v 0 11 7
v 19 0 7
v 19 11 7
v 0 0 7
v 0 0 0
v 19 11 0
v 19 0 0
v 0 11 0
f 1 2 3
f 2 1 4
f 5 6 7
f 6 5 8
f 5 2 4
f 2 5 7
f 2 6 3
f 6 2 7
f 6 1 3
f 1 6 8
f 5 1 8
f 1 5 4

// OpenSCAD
// Generated by SolidPython 1.0.1 on 2020-07-29 00:46:56


cube(size = [19, 11, 7]);
/***********************************************
*********      SolidPython code:      **********
************************************************
 
# import packages: SolidPython
from solid import *
from solid.utils import *
from itertools import chain, combinations, permutations


class Resize:

    def __init__(self, scad_file):
        self.scad_file = scad_file
        #self.scad_file = import_scad(scad_file)
        # cone/cylinder param:
        self.r1 = 0
        self.r2 = 0
        self.h = 0
        # rectangular prism param:
        self.w = 0
        self.l = 0
        # ellipse param:
        self.r = 0

    # import OpenScad code (file name corresponds to shape)


    # classify shape + parameters
    def assign(self, param1, param2, param3):
        if self.scad_file == 'cone.scad':
            self.r1 = param1
            self.r2 = param2
            self.h = param3
        elif self.scad_file == 'cylinder.scad':
            self.r1 = param1
            self.r2 = param2
            self.h = param3
        elif self.scad_file == 'rectangularPrism.scad':
            self.h = param1
            self.l = param2
            self.w = param3
        else:
            self.r = param1
            self.h = param2

    # resize parameters
    def iterate(self):
        x = range(3, 20, 2)
        i = 1
        if self.scad_file == 'cone.scad':
            tempList = list(permutations(x, 2))
            for temp in tempList:
                param1 = temp[0]
                param2 = temp[1]
                filepath = 'produced_scad_files/' + 'cone' + str(param1) + '_' + str(param2) + '_' + '.scad'
                scad_render_to_file(cylinder(h=param1, r1=param2, r2=0), filepath)

        elif self.scad_file == 'cylinder.scad':
            tempList = list(permutations(x, 3))
            for temp in tempList:
                param1 = temp[0]
                param2 = temp[1]
                filepath = 'produced_scad_files/' + 'cylinder' + str(param1) + '_' + str(param2) + '_' + '.scad'
                scad_render_to_file(cylinder(h=param1, r1=param2, r2=param2), filepath)

        elif self.scad_file == 'rectangularPrism.scad':
            tempList = list(permutations(x, 3))
            for temp in tempList:
                param1 = temp[0]
                param2 = temp[1]
                param3 = temp[2]
                filepath = 'produced_scad_files/' + 'rectangularPrism' + str(param1) + '_' + str(param2) + '_' + str(
                    param3) + '.scad'
                scad_render_to_file(cube(size=(param1, param2, param3)), filepath)

        elif self.scad_file == 'ellipse.scad':
            tempList = list(permutations(x, 4))
            for temp in tempList:
                param1 = temp[0]
                param2 = temp[1]
                param3 = temp[2]
                param4 = temp[3]
                filepath = 'produced_scad_files/' + 'ellipse' + str(param1) + '_' + str(param2) + '_' + str(param3) + '_' + str(param4) + '.scad'
                scad_render_to_file(scale([param1, param2, param3])(sphere(r=param4)), filepath)

    def render_to_scadfile(self):
        scad_render_to_file(scad, 'example.scad') 
 
************************************************/
